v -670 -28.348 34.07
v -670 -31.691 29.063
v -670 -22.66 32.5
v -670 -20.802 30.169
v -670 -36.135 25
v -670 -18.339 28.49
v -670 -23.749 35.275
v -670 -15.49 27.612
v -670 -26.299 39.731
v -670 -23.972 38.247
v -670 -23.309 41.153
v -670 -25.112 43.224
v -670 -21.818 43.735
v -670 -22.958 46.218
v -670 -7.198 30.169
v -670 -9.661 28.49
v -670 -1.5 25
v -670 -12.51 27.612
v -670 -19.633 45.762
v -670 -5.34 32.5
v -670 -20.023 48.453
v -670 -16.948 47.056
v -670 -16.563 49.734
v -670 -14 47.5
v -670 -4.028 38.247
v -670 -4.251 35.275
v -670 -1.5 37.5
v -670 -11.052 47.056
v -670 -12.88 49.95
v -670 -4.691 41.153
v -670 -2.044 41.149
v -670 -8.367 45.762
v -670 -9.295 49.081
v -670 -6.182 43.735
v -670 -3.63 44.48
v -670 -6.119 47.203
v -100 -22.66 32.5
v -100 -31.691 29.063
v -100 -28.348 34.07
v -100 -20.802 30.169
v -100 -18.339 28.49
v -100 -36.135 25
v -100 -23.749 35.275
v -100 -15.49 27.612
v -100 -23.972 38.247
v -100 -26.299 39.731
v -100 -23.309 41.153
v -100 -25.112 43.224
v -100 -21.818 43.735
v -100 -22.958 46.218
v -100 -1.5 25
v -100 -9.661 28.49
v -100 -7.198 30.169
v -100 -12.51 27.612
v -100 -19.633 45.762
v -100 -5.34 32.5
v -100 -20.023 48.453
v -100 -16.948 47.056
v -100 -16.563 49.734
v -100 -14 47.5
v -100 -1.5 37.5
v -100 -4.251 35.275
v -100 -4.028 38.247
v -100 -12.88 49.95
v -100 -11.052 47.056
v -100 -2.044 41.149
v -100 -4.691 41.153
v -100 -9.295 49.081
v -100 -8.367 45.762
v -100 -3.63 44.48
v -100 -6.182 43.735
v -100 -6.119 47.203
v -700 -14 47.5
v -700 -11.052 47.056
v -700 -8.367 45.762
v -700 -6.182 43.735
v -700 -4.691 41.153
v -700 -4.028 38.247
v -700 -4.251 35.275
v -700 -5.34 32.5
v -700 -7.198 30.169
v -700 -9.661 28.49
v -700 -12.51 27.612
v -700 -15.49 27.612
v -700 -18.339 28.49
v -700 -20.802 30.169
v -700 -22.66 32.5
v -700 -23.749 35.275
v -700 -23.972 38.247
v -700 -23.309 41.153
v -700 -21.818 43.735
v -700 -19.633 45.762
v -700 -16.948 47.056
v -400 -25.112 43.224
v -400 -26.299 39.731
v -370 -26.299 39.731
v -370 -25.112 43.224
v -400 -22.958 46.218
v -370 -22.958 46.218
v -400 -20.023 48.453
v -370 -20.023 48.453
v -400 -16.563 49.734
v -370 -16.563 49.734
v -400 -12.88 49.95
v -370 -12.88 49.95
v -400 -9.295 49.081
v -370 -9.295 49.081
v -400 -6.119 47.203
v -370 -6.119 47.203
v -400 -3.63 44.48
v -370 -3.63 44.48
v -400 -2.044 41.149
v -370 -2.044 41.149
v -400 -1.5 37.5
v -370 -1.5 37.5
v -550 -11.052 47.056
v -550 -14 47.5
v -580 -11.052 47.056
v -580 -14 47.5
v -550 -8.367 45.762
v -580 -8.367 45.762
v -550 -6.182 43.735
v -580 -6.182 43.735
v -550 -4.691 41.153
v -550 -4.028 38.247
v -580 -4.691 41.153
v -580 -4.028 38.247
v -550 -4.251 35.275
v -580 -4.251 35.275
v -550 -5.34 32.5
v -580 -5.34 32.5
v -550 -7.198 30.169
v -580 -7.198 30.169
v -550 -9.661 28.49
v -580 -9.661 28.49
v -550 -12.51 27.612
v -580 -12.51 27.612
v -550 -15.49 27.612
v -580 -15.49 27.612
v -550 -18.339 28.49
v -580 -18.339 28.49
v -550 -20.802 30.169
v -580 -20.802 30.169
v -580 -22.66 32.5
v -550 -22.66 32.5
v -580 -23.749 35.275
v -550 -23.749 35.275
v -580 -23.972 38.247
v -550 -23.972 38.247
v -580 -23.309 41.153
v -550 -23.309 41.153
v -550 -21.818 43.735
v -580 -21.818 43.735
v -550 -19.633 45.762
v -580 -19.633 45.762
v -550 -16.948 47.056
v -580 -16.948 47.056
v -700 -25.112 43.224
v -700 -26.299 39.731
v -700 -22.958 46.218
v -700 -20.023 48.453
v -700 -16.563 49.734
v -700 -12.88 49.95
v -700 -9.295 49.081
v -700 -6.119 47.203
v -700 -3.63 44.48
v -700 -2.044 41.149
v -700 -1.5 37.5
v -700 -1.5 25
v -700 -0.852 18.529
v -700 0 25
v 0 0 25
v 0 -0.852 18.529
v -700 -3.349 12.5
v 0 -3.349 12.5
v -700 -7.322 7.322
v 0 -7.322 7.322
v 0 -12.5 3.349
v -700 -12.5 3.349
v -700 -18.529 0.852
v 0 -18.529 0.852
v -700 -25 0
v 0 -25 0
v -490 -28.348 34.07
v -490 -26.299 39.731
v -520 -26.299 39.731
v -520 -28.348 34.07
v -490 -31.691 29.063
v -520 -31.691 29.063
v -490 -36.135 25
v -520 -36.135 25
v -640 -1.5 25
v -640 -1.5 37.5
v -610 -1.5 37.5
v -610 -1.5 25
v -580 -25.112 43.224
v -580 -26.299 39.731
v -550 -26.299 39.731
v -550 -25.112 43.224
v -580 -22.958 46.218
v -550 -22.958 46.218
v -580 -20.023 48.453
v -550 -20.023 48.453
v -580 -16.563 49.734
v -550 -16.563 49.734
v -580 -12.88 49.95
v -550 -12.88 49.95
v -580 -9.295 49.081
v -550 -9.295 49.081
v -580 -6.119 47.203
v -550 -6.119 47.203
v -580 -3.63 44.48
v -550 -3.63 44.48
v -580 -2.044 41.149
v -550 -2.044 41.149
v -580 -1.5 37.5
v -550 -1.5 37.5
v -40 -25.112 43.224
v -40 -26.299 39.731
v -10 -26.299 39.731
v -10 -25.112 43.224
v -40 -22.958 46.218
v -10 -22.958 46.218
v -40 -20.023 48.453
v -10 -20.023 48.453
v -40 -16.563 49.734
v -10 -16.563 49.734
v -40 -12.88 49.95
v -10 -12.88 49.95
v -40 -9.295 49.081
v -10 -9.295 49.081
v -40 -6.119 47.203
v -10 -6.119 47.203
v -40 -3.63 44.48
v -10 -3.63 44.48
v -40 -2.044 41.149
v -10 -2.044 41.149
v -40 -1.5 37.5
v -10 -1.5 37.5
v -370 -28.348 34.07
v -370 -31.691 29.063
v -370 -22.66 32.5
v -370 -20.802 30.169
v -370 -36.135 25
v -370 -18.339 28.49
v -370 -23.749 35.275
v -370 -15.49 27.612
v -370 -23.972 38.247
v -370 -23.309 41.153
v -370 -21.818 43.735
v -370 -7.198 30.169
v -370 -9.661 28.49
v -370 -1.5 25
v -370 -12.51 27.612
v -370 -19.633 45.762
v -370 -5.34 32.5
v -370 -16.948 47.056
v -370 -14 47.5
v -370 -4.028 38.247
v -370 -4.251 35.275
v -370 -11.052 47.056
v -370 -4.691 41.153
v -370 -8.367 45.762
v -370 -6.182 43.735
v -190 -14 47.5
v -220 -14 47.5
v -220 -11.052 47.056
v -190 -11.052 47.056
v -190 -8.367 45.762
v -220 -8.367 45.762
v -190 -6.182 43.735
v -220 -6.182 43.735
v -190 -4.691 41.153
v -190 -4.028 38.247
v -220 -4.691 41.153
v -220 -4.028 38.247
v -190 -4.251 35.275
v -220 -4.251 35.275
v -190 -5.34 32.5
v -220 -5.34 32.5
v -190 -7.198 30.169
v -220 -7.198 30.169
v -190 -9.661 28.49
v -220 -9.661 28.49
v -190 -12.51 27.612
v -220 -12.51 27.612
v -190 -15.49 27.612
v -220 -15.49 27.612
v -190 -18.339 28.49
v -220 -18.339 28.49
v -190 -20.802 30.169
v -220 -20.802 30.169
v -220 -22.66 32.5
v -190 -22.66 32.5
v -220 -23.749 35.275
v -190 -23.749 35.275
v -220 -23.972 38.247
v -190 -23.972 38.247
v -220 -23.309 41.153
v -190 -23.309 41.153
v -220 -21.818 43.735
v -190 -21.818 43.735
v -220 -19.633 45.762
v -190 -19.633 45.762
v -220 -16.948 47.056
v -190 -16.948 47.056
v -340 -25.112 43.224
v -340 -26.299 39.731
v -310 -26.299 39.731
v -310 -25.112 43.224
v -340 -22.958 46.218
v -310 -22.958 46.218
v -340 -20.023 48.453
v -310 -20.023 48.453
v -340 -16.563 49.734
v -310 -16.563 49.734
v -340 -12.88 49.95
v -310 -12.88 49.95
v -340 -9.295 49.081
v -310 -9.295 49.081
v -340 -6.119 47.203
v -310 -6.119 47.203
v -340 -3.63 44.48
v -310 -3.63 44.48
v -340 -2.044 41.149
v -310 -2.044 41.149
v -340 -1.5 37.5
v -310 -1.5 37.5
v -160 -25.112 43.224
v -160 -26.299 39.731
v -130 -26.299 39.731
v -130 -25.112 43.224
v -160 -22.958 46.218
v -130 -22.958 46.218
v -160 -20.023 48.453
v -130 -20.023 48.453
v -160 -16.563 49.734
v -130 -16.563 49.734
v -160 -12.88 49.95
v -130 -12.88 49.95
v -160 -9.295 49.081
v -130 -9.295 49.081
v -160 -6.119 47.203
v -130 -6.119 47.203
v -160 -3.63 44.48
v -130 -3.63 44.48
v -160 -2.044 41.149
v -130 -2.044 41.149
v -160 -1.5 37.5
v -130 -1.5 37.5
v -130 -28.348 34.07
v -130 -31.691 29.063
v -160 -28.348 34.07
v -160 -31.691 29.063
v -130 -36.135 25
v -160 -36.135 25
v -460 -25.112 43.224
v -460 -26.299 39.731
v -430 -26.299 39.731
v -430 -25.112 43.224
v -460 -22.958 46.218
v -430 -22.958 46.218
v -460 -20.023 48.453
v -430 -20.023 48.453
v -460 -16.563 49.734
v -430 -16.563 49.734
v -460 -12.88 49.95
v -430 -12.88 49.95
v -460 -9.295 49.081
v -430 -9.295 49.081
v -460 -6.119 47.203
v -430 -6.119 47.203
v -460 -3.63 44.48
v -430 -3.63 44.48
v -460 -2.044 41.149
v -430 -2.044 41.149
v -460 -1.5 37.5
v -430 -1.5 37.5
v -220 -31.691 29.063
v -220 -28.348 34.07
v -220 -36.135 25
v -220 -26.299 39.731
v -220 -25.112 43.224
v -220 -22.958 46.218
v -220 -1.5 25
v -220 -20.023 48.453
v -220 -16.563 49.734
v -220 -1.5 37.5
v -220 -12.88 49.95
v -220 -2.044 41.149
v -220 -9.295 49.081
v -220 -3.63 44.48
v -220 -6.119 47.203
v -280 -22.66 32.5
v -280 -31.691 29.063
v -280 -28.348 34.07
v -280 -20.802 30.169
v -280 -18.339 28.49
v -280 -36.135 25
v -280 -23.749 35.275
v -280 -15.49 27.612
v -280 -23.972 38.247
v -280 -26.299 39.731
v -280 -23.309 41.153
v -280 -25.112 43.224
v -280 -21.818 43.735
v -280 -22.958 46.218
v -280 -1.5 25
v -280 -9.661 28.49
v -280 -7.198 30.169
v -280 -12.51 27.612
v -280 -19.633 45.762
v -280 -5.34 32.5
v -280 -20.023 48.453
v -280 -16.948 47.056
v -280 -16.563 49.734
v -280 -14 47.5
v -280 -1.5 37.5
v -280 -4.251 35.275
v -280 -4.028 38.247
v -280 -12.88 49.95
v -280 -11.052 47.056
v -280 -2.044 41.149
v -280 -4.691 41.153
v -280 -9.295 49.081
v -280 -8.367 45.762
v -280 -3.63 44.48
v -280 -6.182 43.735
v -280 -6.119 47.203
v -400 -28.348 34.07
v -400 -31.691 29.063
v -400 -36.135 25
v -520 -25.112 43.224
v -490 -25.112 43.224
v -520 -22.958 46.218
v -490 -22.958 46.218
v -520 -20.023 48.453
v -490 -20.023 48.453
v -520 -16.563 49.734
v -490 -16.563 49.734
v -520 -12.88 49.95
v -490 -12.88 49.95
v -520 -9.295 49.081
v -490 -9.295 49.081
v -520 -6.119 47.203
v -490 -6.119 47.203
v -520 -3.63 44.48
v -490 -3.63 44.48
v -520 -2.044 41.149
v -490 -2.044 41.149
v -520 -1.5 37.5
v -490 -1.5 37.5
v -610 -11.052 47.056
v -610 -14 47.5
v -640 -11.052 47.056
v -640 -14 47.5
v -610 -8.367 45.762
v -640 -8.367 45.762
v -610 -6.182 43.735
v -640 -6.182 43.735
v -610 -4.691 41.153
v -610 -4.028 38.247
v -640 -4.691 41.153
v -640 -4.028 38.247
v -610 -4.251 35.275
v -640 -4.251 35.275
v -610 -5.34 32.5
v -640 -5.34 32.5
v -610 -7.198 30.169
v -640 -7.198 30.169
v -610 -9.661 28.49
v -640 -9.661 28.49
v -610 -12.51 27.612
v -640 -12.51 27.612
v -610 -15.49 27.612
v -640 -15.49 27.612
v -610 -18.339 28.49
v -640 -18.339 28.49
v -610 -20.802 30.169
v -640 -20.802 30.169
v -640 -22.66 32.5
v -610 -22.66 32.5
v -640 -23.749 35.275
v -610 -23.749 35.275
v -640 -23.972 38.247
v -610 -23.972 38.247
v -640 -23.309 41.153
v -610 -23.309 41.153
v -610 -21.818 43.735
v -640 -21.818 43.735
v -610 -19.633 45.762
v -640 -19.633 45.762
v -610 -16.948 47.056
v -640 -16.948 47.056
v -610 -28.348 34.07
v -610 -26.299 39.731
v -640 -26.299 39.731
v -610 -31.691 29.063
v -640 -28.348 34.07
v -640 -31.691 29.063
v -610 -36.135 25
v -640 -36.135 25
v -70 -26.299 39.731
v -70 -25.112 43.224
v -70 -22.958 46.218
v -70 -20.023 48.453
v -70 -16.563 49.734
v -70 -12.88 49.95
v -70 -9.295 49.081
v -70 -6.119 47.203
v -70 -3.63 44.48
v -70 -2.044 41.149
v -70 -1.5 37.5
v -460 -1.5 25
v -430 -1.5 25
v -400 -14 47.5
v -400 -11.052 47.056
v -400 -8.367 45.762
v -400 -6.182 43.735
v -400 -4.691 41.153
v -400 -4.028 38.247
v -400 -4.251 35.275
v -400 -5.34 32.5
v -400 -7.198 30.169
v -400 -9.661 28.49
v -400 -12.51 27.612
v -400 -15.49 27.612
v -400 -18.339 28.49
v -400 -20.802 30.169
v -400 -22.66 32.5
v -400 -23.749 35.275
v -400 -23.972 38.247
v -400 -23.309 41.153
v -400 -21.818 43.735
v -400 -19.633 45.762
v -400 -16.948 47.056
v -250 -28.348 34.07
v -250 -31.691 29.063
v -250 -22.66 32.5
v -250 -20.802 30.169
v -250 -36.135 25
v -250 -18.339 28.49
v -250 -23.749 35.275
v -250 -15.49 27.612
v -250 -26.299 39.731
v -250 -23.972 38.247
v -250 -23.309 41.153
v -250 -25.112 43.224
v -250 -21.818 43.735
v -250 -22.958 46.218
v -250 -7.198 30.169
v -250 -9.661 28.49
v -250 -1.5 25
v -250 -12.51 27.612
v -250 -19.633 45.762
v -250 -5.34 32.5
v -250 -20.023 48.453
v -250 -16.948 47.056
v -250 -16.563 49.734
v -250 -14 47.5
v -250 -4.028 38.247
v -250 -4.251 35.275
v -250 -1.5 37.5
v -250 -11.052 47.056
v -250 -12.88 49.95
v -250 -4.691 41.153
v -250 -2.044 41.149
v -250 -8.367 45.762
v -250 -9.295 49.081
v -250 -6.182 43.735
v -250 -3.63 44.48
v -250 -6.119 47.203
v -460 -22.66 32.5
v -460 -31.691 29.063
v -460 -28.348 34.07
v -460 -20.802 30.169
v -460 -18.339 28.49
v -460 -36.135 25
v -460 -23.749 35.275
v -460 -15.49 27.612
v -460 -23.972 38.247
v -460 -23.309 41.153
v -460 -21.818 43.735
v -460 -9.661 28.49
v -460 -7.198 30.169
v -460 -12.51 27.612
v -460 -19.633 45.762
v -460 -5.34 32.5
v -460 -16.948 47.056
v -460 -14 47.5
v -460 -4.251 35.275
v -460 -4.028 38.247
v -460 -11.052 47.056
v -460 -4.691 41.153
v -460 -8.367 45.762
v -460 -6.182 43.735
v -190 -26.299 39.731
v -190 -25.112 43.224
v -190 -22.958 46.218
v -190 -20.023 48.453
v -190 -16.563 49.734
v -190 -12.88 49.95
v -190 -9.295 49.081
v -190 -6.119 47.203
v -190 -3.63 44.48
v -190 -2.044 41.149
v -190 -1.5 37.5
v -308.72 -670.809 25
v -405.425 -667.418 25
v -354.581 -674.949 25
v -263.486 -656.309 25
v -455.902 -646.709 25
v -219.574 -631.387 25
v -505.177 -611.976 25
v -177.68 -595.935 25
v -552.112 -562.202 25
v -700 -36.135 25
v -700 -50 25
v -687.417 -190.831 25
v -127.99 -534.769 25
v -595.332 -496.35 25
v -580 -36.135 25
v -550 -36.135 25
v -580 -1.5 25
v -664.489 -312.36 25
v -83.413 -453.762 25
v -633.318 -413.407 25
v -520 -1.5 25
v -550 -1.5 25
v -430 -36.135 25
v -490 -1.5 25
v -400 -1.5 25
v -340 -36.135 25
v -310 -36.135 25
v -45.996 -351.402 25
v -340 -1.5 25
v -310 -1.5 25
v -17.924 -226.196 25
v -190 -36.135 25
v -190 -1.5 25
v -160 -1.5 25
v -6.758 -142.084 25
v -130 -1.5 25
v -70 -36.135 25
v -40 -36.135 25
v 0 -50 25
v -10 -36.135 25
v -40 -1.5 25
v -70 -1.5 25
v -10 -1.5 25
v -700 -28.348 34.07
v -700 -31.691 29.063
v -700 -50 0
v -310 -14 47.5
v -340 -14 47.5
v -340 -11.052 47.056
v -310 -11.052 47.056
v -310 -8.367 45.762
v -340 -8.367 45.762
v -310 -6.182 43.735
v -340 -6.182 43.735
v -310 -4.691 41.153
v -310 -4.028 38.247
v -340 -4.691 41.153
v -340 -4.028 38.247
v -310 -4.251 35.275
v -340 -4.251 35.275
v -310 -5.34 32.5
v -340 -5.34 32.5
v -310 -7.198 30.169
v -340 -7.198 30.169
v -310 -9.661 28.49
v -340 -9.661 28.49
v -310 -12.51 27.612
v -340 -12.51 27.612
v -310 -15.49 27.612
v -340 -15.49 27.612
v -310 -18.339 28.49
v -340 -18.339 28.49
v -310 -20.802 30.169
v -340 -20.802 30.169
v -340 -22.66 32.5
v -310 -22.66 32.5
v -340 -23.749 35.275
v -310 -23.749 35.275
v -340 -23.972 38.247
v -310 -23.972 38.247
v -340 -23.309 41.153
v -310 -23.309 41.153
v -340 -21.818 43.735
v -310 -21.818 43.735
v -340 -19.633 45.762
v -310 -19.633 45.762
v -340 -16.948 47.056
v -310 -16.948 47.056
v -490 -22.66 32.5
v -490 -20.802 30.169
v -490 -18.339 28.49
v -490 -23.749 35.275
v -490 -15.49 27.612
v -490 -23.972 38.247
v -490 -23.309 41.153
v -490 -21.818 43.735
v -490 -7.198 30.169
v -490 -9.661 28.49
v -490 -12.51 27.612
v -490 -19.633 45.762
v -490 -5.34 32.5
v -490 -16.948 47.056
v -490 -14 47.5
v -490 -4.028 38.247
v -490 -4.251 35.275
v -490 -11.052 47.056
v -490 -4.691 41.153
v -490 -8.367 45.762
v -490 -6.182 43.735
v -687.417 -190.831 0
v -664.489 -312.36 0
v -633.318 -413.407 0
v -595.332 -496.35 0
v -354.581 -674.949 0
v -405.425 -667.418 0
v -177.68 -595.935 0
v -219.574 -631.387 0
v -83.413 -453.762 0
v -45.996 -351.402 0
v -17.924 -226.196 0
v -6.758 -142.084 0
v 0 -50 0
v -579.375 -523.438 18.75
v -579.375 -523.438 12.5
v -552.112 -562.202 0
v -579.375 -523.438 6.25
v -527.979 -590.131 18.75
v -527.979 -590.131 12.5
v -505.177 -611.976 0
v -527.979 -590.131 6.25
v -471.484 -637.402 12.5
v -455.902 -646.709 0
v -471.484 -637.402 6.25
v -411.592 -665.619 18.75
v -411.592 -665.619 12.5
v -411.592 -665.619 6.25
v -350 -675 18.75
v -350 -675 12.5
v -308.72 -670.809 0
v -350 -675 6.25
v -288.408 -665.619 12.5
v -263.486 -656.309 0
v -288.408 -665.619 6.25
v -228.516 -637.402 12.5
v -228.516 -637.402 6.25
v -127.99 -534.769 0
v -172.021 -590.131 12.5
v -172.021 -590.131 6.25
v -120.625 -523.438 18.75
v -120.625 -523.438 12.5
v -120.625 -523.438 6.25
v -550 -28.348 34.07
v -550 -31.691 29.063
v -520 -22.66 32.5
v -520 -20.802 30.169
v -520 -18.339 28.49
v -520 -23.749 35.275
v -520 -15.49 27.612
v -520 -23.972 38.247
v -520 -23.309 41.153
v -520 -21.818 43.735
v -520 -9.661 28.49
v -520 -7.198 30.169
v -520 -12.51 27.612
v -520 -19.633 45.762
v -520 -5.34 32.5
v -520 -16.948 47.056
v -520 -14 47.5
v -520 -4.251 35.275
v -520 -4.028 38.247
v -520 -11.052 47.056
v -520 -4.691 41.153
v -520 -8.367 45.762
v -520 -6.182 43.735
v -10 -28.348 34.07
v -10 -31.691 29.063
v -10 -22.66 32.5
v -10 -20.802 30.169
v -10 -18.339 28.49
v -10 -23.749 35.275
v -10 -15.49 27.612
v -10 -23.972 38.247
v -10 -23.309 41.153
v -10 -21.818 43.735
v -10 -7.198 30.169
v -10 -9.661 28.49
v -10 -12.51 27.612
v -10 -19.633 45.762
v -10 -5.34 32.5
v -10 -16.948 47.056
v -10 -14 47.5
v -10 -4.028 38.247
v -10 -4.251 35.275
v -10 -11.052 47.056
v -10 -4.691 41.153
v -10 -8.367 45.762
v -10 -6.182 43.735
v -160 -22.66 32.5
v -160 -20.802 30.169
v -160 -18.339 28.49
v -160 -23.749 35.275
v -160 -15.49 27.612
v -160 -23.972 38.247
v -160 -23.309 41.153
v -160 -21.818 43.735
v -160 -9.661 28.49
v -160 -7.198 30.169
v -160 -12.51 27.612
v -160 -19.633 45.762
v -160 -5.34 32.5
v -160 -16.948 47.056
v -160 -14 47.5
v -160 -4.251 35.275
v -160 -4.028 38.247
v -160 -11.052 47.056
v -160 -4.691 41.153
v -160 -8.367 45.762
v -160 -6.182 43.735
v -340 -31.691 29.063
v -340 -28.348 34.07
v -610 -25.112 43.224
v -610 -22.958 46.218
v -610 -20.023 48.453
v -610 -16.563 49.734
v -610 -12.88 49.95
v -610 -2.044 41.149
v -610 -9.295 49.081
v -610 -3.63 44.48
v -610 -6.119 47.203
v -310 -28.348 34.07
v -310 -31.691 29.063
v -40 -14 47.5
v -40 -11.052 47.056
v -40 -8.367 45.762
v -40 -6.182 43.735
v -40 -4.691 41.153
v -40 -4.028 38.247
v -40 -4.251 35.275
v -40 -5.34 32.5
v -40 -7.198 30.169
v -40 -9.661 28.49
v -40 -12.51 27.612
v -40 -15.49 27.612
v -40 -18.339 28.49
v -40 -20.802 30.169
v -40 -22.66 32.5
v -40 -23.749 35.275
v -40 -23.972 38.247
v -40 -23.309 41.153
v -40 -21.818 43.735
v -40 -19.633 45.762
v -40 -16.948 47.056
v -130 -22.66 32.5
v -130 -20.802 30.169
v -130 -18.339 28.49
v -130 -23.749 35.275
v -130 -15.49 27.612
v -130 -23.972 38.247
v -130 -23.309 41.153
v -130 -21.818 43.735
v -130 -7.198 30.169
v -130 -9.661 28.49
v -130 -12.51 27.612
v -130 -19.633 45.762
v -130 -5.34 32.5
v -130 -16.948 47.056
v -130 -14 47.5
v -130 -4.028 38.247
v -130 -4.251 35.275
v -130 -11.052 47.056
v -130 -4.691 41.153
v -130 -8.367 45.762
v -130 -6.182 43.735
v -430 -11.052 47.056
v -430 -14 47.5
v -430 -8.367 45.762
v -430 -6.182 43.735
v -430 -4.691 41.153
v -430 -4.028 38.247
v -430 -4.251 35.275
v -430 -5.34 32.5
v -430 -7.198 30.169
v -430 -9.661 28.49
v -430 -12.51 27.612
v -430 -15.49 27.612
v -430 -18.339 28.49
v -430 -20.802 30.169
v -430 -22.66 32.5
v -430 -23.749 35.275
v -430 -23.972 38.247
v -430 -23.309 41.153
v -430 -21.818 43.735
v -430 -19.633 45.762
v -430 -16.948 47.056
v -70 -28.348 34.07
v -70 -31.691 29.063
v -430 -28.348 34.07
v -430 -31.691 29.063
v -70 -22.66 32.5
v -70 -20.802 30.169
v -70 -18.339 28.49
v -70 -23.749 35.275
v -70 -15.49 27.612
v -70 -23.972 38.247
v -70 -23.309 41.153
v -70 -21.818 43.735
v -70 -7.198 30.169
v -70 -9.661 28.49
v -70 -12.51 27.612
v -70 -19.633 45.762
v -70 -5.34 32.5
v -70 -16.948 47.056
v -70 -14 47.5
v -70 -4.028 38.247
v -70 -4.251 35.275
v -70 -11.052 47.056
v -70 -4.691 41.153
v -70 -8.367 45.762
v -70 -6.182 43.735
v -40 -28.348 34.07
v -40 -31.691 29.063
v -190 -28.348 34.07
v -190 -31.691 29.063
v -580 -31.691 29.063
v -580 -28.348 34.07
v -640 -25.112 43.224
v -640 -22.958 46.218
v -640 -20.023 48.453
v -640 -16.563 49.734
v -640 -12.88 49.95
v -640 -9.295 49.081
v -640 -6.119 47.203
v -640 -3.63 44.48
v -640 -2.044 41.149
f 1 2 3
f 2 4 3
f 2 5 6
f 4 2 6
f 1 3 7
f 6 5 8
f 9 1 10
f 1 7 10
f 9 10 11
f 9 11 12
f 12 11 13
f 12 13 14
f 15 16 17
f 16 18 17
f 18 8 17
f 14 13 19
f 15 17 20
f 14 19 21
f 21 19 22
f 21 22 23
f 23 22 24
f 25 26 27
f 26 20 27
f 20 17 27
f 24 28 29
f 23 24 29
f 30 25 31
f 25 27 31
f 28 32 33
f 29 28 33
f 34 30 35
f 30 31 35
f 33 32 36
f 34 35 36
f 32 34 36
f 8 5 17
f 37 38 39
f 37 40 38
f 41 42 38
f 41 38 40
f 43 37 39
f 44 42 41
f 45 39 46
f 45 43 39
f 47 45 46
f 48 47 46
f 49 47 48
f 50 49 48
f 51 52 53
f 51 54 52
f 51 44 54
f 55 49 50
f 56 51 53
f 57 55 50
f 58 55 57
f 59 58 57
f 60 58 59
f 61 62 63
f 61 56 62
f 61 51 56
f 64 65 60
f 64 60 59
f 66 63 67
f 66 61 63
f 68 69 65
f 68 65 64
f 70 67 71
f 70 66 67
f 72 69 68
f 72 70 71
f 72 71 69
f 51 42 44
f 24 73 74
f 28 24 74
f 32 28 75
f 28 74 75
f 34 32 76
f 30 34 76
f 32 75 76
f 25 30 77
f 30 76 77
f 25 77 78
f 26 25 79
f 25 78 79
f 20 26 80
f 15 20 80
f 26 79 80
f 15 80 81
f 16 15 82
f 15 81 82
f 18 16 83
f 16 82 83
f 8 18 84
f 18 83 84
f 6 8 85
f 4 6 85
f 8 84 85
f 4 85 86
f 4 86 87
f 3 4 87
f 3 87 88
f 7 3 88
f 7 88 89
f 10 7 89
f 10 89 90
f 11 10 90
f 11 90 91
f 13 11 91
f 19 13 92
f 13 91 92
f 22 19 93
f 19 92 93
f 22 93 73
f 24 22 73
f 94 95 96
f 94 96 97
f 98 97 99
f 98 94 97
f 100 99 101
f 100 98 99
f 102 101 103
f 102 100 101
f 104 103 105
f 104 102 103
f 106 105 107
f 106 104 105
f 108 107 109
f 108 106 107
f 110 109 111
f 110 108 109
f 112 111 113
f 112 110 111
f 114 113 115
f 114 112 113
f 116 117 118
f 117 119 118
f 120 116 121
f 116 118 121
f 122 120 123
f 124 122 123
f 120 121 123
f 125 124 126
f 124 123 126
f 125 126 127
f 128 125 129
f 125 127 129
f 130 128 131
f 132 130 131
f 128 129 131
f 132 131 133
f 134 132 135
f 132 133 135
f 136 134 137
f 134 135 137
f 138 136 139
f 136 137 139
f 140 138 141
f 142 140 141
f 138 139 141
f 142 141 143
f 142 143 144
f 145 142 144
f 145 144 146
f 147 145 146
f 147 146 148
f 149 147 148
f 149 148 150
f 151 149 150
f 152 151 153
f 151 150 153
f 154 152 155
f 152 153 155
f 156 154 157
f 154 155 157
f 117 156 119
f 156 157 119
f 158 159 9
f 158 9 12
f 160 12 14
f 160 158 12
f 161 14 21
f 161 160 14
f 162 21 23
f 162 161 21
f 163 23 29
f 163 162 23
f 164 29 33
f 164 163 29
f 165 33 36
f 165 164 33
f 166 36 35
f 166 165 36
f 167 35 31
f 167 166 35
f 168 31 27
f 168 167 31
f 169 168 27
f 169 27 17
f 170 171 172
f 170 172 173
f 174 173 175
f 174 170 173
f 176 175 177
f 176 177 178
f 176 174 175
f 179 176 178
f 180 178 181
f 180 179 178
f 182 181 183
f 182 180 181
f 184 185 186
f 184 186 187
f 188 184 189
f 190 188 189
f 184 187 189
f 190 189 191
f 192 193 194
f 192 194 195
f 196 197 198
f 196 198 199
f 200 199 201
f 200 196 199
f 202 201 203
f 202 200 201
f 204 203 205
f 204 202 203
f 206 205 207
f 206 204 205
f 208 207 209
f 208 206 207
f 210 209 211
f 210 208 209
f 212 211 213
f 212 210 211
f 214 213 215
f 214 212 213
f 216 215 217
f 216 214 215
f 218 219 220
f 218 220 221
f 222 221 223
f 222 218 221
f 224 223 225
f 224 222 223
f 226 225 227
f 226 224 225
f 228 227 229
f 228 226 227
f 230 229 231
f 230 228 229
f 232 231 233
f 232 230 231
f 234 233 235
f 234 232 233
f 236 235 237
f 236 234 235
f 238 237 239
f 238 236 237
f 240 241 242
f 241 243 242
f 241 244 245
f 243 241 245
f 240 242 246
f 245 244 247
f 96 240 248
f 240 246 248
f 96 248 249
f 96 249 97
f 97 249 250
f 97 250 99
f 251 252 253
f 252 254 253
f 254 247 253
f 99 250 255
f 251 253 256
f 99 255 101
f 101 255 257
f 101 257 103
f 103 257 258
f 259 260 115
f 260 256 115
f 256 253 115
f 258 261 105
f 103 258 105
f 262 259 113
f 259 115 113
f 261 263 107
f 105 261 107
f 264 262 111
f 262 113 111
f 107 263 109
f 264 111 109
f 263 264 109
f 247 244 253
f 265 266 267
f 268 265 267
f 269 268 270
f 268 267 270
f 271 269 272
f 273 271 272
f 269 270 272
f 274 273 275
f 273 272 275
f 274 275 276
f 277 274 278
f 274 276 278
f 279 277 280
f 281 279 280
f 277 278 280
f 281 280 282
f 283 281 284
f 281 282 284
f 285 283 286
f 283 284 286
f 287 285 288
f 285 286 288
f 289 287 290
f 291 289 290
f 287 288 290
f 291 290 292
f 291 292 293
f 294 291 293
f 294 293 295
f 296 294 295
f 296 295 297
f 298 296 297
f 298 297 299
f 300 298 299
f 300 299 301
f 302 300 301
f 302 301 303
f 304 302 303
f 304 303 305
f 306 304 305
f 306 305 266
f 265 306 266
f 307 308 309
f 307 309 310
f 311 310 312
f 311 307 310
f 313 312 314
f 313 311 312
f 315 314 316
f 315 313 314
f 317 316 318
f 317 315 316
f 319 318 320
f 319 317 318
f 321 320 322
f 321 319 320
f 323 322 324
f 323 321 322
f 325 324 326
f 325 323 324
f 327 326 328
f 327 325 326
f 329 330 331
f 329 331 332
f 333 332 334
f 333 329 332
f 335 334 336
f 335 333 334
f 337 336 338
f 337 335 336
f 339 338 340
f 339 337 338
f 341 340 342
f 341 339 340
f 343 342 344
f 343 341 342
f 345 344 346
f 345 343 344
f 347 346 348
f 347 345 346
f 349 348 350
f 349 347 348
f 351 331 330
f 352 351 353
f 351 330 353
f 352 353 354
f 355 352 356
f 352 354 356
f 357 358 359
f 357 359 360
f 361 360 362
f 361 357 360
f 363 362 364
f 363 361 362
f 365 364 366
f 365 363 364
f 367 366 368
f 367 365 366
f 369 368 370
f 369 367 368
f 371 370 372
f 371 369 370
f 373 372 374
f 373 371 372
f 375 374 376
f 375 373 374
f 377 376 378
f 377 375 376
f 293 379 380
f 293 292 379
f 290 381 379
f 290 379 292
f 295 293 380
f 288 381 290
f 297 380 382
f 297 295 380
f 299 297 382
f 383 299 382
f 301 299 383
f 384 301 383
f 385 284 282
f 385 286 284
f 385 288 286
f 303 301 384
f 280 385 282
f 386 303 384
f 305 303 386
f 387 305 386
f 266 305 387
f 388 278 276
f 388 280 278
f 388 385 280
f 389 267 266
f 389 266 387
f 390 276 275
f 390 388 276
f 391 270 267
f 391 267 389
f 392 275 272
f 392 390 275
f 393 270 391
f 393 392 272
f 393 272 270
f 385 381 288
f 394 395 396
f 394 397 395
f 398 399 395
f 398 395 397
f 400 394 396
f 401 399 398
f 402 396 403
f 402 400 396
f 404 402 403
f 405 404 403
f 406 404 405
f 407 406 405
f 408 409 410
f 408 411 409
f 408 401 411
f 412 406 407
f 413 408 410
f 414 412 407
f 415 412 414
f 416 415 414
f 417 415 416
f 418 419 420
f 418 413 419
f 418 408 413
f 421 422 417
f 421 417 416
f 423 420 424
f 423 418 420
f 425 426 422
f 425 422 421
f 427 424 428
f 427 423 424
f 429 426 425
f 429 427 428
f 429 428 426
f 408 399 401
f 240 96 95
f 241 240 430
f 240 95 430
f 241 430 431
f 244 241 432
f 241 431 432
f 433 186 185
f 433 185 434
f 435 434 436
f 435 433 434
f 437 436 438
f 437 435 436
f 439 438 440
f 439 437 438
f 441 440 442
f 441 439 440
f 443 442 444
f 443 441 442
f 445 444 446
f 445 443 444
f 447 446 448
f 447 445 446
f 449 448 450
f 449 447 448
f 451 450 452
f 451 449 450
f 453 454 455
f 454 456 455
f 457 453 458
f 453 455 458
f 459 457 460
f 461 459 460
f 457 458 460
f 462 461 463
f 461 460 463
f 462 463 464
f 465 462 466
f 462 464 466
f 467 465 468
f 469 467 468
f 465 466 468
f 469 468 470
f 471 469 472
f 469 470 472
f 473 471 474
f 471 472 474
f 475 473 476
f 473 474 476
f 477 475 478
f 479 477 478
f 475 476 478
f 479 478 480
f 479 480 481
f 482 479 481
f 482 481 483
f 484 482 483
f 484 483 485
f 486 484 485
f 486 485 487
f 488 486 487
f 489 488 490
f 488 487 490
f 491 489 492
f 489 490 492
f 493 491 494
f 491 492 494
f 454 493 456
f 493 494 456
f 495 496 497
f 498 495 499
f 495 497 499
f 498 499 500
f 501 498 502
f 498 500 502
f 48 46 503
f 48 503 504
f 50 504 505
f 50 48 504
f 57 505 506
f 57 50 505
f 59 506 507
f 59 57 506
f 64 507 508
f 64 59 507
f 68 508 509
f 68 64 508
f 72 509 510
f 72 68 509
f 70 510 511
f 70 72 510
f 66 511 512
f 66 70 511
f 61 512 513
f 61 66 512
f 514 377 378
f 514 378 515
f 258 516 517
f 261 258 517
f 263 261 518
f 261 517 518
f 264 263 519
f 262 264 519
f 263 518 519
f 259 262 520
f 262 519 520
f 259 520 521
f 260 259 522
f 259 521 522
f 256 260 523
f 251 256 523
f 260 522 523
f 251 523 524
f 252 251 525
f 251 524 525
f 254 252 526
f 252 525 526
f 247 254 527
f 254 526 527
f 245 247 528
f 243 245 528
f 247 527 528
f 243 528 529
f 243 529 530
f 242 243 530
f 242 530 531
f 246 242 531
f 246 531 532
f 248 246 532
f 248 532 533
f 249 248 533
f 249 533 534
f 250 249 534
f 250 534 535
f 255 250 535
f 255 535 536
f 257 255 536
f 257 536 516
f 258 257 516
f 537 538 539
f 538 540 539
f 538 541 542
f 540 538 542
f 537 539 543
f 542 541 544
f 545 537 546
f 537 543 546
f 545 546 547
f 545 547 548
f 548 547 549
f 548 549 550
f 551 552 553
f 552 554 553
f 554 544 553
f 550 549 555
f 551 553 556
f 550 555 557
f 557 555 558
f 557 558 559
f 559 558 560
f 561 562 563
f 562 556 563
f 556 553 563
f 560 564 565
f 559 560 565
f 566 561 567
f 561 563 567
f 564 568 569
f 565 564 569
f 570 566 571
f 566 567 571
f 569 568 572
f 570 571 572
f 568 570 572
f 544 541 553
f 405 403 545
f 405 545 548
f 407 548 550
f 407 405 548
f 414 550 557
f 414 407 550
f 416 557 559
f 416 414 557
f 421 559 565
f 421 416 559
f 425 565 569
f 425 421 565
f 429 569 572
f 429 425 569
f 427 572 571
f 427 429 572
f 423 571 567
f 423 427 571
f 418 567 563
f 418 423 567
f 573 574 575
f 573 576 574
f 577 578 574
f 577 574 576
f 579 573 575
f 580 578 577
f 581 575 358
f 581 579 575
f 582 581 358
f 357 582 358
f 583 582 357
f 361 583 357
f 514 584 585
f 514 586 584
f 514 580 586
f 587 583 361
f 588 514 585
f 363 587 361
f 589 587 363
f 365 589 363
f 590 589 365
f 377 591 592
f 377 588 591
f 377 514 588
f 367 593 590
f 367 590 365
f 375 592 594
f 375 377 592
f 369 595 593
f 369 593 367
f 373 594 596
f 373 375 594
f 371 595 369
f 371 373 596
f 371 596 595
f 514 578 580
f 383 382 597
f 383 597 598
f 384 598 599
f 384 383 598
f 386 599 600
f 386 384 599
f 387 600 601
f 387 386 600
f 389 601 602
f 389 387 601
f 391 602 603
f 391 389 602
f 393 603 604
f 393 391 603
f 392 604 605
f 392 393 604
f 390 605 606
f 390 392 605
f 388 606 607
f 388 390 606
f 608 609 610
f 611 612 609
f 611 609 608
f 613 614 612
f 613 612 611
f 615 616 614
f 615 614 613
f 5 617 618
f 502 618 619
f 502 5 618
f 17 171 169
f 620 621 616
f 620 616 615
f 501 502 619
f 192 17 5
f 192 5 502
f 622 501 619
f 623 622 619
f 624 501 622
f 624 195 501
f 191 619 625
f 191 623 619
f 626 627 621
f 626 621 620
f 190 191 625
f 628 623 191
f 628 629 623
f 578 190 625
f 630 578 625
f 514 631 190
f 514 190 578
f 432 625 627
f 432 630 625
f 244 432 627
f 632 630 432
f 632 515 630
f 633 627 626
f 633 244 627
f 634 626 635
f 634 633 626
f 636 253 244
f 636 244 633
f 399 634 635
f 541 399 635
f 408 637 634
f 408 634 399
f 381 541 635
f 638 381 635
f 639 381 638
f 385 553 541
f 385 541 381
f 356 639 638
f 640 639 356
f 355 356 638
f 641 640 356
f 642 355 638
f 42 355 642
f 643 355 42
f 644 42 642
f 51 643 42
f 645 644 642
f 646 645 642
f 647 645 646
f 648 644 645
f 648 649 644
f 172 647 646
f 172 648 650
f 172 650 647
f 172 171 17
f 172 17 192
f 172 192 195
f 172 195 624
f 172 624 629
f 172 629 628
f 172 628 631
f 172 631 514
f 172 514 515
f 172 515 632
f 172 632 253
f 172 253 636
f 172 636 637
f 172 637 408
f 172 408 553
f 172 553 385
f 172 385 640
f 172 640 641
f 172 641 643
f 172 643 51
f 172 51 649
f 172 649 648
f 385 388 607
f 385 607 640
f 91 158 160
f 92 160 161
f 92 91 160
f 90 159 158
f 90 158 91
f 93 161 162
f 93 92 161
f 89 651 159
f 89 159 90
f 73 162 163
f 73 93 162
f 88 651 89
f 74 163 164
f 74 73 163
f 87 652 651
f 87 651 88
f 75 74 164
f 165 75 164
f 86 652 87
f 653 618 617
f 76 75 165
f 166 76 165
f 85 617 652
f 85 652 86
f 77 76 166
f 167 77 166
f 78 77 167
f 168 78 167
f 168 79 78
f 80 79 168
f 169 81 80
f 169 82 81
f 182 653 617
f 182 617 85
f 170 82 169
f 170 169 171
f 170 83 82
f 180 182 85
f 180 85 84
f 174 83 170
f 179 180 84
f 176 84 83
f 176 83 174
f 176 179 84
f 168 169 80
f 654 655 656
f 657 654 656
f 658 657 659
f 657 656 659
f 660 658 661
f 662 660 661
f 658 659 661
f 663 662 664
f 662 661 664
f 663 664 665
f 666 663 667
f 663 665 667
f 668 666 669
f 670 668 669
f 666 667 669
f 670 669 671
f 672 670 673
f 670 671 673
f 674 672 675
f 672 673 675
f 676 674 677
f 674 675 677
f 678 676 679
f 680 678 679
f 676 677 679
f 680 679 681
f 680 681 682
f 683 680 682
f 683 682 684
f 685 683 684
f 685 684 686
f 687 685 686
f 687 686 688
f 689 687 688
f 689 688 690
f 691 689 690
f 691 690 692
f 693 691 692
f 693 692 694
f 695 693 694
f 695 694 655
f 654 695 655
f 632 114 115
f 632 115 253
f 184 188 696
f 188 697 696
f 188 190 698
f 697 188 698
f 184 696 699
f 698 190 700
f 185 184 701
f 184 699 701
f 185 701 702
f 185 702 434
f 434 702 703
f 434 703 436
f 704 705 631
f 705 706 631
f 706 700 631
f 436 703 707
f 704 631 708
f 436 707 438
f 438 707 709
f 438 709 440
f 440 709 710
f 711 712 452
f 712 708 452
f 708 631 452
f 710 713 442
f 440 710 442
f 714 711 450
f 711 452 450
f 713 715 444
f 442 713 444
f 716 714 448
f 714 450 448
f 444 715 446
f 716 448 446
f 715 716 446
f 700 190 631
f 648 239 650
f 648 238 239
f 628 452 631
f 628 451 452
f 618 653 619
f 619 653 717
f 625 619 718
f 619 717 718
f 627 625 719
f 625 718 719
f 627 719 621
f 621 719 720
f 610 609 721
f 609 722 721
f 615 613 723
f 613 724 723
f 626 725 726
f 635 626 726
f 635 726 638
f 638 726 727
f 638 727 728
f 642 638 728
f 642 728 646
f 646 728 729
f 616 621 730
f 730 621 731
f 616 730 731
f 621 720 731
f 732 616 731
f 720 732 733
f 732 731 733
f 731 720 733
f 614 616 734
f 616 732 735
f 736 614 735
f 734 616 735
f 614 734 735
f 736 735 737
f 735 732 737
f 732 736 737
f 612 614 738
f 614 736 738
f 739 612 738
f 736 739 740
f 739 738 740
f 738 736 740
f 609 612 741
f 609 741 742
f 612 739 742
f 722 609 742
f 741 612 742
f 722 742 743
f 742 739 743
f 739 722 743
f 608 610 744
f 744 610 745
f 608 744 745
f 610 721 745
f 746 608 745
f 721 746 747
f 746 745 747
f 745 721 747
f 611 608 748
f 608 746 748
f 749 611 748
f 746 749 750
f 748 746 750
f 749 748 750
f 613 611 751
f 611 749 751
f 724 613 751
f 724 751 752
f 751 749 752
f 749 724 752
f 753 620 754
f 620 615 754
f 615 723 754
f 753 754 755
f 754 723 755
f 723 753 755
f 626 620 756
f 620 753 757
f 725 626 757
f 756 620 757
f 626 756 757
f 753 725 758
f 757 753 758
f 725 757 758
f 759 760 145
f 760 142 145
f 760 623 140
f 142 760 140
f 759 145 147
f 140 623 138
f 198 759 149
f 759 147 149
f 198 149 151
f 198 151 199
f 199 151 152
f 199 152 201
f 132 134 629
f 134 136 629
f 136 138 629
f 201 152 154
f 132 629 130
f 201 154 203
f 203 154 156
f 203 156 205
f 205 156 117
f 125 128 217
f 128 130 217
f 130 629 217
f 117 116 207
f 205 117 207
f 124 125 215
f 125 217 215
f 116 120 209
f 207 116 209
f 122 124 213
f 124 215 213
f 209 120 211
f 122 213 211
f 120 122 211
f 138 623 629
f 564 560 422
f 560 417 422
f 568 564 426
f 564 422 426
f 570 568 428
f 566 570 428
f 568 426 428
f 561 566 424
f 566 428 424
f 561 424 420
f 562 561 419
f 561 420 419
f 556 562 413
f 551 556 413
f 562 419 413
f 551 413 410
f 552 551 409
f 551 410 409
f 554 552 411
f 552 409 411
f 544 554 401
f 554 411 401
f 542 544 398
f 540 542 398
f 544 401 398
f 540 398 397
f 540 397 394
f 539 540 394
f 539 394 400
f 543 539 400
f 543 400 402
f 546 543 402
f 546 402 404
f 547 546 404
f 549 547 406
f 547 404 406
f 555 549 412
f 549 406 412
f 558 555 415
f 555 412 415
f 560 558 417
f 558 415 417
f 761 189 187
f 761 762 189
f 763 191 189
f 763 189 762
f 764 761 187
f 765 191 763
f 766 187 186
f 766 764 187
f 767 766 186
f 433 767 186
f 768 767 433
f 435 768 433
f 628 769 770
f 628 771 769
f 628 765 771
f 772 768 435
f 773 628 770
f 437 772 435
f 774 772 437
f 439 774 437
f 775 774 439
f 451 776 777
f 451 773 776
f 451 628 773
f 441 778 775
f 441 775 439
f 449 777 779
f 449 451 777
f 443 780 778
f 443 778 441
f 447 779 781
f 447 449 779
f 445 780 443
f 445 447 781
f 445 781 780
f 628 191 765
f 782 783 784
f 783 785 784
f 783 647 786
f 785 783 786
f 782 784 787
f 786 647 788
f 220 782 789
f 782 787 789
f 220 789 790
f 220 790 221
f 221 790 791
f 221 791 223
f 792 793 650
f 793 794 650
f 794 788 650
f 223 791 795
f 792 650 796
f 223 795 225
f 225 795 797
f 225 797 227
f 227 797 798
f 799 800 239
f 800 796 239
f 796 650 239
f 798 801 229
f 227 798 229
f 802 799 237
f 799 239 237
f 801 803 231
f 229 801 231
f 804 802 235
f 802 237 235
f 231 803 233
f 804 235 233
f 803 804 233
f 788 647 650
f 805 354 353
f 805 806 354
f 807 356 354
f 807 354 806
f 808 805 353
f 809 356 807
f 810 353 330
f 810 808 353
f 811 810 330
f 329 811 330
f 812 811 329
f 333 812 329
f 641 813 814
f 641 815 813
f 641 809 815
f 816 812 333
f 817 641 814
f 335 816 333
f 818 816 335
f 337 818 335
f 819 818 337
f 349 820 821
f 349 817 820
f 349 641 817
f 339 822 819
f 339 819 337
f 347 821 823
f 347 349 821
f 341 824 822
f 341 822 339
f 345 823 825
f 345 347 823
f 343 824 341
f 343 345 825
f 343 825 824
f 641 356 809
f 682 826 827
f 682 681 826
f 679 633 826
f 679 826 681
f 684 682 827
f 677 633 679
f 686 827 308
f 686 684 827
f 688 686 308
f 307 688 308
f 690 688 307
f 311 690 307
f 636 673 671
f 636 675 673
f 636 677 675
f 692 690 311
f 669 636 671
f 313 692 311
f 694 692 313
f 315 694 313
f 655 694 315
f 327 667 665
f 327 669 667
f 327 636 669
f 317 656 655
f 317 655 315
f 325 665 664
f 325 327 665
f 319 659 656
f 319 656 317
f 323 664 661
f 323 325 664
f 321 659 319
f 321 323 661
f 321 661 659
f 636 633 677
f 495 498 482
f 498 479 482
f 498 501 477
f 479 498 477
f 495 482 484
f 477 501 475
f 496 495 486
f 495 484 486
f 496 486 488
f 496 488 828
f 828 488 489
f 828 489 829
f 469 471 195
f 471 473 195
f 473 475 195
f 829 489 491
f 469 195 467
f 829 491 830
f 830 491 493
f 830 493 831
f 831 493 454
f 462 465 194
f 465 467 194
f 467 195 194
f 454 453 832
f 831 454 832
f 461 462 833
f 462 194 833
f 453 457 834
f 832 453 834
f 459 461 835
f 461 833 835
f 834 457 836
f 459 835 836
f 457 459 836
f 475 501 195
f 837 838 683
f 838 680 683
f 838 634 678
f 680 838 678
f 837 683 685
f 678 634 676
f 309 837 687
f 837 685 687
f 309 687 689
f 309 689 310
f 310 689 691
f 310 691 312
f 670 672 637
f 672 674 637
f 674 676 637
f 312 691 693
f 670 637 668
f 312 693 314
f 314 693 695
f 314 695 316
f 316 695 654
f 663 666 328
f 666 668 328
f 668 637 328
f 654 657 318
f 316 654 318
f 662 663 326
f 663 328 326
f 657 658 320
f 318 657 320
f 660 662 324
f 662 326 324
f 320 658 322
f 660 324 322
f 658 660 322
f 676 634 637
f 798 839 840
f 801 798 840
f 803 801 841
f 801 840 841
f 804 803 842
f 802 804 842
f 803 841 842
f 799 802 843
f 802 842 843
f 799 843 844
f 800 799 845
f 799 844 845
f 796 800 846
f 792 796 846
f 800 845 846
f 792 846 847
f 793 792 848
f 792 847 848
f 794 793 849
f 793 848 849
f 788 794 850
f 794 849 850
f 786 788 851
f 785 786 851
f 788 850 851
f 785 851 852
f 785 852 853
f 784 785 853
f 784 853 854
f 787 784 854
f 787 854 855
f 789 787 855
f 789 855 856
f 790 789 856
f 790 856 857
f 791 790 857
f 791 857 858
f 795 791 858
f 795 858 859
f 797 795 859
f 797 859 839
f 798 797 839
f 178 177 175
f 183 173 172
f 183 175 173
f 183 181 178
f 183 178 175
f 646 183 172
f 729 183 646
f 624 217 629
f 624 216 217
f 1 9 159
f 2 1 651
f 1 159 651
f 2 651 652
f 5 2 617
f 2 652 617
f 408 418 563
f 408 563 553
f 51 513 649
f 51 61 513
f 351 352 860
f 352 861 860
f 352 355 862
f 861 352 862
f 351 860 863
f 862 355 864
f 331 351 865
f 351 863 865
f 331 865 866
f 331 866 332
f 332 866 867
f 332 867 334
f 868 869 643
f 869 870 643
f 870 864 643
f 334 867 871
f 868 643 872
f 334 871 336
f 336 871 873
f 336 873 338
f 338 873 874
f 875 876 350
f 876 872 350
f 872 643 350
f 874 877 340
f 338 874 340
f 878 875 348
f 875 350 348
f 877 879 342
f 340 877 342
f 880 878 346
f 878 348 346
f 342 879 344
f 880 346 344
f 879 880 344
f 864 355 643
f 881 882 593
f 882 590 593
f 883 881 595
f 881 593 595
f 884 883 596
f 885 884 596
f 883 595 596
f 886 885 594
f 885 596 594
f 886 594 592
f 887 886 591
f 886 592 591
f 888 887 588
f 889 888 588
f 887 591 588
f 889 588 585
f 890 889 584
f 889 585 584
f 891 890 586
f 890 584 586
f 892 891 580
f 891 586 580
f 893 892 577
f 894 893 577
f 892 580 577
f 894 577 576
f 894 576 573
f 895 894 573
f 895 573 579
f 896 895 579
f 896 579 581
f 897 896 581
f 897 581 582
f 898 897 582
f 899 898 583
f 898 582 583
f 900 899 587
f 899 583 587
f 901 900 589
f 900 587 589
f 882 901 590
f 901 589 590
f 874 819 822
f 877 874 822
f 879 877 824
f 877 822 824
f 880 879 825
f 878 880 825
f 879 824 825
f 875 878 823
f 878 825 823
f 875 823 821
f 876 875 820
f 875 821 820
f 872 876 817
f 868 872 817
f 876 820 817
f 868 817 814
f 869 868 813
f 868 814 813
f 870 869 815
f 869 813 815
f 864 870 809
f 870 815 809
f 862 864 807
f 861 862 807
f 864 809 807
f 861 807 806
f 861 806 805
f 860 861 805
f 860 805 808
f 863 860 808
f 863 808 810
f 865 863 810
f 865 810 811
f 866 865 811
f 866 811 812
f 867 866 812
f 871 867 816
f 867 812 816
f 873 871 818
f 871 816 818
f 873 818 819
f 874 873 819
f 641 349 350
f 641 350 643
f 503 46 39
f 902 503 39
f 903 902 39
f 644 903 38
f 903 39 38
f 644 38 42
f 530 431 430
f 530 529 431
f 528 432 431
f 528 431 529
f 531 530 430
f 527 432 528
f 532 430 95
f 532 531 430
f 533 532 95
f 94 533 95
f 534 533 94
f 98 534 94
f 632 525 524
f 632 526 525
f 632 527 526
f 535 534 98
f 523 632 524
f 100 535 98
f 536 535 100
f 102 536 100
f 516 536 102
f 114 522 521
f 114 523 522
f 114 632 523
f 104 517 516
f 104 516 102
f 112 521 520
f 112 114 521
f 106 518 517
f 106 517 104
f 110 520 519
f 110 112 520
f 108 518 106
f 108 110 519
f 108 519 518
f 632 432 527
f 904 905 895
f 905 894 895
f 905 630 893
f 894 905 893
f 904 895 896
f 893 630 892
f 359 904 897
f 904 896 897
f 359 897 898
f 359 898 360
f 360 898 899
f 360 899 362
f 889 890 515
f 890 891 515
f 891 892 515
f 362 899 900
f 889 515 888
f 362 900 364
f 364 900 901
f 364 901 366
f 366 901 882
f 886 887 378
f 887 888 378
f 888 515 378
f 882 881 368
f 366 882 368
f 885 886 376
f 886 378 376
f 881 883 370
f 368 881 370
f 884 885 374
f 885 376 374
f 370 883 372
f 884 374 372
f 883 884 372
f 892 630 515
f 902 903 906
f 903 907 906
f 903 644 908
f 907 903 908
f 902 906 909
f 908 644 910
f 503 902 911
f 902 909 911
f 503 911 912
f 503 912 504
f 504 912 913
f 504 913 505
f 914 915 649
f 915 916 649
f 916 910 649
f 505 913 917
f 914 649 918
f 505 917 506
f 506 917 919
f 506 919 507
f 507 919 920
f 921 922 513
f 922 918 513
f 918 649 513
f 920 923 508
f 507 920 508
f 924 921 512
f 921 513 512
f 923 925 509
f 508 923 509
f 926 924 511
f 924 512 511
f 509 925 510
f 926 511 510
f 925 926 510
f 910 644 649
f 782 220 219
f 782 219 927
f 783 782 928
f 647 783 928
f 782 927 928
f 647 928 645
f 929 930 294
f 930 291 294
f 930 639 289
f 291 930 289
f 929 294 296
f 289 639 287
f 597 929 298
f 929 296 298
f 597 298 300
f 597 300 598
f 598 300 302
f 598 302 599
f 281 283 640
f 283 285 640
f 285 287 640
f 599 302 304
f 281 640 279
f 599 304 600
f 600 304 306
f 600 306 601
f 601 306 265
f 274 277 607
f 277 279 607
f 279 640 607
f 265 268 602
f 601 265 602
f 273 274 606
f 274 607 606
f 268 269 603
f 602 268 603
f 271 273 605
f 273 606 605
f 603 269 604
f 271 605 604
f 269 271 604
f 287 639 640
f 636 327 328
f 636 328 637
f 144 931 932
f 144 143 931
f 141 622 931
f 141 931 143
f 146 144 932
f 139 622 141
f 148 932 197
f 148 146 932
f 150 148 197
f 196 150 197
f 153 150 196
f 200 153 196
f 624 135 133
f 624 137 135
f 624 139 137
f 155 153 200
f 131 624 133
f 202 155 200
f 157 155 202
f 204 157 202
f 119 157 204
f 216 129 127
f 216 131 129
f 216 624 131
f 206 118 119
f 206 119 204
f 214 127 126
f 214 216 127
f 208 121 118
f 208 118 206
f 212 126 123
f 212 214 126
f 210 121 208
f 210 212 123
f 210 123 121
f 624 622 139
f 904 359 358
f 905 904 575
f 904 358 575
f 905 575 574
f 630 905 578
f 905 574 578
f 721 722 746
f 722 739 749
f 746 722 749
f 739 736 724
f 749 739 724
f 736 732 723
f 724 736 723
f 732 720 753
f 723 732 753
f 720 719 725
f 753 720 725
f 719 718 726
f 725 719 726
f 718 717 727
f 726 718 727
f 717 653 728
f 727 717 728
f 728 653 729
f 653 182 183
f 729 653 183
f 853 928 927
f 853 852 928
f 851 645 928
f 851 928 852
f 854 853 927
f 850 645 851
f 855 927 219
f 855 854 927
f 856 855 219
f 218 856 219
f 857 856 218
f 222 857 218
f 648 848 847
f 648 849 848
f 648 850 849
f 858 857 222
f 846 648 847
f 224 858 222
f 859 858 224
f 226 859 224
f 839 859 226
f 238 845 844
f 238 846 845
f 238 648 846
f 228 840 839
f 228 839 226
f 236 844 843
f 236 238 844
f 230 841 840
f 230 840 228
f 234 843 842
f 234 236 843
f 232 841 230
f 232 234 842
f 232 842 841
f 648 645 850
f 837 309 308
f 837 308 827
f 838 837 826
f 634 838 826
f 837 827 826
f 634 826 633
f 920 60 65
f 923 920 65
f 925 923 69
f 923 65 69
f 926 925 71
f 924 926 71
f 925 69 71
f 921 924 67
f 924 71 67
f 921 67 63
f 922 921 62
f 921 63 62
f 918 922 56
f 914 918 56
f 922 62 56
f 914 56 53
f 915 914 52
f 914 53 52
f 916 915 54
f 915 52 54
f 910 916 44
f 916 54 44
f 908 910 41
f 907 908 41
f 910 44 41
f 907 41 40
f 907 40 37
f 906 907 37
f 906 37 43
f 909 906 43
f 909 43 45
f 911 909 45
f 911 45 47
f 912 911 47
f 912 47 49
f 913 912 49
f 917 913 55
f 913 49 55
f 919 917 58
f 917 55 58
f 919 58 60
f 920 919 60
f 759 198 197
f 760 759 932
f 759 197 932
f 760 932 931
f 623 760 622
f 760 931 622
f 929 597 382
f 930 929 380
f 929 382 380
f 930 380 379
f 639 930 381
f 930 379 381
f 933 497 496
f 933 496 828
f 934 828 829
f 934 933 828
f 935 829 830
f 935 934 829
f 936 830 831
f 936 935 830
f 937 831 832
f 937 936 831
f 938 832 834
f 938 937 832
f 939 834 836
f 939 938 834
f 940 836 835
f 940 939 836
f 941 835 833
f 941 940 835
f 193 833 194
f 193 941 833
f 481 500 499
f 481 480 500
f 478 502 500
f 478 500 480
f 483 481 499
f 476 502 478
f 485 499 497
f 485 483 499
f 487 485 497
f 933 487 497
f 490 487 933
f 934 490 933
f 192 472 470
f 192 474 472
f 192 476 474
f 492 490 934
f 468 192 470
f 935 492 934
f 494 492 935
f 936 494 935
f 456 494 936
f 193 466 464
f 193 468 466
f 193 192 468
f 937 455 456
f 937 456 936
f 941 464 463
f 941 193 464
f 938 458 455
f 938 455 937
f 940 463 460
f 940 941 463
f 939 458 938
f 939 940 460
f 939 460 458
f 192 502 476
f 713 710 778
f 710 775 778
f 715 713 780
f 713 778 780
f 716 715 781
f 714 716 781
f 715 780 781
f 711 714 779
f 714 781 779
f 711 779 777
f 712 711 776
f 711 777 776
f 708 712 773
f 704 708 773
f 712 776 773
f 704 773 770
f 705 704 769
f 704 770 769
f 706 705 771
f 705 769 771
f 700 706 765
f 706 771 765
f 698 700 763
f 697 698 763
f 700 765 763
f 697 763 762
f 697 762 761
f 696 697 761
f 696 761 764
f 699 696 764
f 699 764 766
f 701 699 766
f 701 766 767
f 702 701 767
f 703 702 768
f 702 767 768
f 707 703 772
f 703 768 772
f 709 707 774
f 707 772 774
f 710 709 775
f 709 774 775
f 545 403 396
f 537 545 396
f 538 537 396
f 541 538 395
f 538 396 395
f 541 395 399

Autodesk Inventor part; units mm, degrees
ref_plane "YZ Plane" through (0, 0, 0) normal (1, 0, 0) x (0, 1, 0)
ref_plane "XZ Plane" through (0, 0, 0) normal (0, 1, 0) x (-1, 0, 0)
ref_plane "XY Plane" through (0, 0, 0) normal (0, 0, 1) x (1, 0, 0)
ref_plane "Work Plane1" through (-701.2547, 0, 0) normal (0, 0, 1) x (1, 0, 0)
sketch "Sketch1" plane through (-701.2547, 0, 0) normal (0, 0, 1) x (1, 0, 0)
  line L0 (557.3903, 26) -> (429.8698, 26) projected
  arc A0 (429.8698, 26) -> (429.8698, 4) centre (429.8698, 15) ccw projected
  line L1 (429.8698, 4) -> (557.3903, 4) projected
  arc A1 (557.3903, 4) -> (557.3903, 26) centre (557.3903, 15) ccw projected
  line L2 (701.2547, 0) -> (1.2547, 0) projected
  line L3 (1.2547, 0) -> (1.2547, 30) projected
  line L4 (1.2547, 30) -> (701.2547, 30) projected
  line L5 (701.2547, 30) -> (701.2547, 0) projected
  line L6 (1.2547, 0) -> (701.2547, 0)
  line L7 (701.2547, 0) -> (701.2547, -50)
  line L8 (701.2547, -50) -> (1.2547, -50)
  line L9 (1.2547, -50) -> (1.2547, 0)
  line L10 (1.2547, -50) -> (31.2547, -700) construction
  line L11 (31.2547, -700) -> (351.2547, -850) construction
  line L12 (351.2547, -850) -> (671.2547, -700) construction
  line L13 (671.2547, -700) -> (701.2547, -50) construction
  spline S0 degree 4 poles (1.2547, -50) (31.2547, -700) (351.2547, -850) (671.2547, -700) (701.2547, -50) knots 1 1 1 1 1 2 2 2 2 2
  dimension "d0" = 50
  dimension "d1" = 850
  dimension "d2" = 700
  dimension "d3" = 30
  dimension "d4" = 30
  dimension "d5" = 350
  dimension "d6" = 350
extrude "Extrusion1" add sketch "Sketch1" along normal blind 25 contours L7 L8 L9 L2 | S0 L8
ref_plane "Work Plane2" through (-700, 0, 1930) normal (-1, 0, 0) x (0, 1, 0)
sketch "Sketch3" plane through (-700, -50, 0) normal (-1, 0, 0) x (0, 0, 1)
  circle A0 centre (37.5, 36) radius 12.5
  line L0 (0, 50) -> (25, 50) projected
  line L1 (25, 50) -> (25, 0) projected
  circle A1 centre (37.5, 36) radius 10
  arc A2 (40.5, 23.8653) -> (25, 13.8653) centre (45.3472, -0.6603) ccw
  line L2 (37.5, 48.5) -> (25, 48.5)
  point P0 (12.5, 50)
  point P1 (39.7301, 23.7006)
  point P2 (25, 36)
  point P3 (25, 41.0707)
  dimension "d11" = 12.5
  dimension "d12" = 2.5
  dimension "d13" = 20
  dimension "d14" = 10
  dimension "d15" = 3
  dimension "d16" = 25
  dimension "d17" = 14
  dimension "d18" = 12.5
extrude "Extrusion2" add sketch "Sketch3" against normal blind 30
fillet "Fillet1" radius 25 1 edges at (-350, 0, 0)
pattern_linear "Rectangular Pattern1" count 12 spacing 60 along (1, 0, 0) of "Extrusion2"
properties part number "back-flaps-3"
